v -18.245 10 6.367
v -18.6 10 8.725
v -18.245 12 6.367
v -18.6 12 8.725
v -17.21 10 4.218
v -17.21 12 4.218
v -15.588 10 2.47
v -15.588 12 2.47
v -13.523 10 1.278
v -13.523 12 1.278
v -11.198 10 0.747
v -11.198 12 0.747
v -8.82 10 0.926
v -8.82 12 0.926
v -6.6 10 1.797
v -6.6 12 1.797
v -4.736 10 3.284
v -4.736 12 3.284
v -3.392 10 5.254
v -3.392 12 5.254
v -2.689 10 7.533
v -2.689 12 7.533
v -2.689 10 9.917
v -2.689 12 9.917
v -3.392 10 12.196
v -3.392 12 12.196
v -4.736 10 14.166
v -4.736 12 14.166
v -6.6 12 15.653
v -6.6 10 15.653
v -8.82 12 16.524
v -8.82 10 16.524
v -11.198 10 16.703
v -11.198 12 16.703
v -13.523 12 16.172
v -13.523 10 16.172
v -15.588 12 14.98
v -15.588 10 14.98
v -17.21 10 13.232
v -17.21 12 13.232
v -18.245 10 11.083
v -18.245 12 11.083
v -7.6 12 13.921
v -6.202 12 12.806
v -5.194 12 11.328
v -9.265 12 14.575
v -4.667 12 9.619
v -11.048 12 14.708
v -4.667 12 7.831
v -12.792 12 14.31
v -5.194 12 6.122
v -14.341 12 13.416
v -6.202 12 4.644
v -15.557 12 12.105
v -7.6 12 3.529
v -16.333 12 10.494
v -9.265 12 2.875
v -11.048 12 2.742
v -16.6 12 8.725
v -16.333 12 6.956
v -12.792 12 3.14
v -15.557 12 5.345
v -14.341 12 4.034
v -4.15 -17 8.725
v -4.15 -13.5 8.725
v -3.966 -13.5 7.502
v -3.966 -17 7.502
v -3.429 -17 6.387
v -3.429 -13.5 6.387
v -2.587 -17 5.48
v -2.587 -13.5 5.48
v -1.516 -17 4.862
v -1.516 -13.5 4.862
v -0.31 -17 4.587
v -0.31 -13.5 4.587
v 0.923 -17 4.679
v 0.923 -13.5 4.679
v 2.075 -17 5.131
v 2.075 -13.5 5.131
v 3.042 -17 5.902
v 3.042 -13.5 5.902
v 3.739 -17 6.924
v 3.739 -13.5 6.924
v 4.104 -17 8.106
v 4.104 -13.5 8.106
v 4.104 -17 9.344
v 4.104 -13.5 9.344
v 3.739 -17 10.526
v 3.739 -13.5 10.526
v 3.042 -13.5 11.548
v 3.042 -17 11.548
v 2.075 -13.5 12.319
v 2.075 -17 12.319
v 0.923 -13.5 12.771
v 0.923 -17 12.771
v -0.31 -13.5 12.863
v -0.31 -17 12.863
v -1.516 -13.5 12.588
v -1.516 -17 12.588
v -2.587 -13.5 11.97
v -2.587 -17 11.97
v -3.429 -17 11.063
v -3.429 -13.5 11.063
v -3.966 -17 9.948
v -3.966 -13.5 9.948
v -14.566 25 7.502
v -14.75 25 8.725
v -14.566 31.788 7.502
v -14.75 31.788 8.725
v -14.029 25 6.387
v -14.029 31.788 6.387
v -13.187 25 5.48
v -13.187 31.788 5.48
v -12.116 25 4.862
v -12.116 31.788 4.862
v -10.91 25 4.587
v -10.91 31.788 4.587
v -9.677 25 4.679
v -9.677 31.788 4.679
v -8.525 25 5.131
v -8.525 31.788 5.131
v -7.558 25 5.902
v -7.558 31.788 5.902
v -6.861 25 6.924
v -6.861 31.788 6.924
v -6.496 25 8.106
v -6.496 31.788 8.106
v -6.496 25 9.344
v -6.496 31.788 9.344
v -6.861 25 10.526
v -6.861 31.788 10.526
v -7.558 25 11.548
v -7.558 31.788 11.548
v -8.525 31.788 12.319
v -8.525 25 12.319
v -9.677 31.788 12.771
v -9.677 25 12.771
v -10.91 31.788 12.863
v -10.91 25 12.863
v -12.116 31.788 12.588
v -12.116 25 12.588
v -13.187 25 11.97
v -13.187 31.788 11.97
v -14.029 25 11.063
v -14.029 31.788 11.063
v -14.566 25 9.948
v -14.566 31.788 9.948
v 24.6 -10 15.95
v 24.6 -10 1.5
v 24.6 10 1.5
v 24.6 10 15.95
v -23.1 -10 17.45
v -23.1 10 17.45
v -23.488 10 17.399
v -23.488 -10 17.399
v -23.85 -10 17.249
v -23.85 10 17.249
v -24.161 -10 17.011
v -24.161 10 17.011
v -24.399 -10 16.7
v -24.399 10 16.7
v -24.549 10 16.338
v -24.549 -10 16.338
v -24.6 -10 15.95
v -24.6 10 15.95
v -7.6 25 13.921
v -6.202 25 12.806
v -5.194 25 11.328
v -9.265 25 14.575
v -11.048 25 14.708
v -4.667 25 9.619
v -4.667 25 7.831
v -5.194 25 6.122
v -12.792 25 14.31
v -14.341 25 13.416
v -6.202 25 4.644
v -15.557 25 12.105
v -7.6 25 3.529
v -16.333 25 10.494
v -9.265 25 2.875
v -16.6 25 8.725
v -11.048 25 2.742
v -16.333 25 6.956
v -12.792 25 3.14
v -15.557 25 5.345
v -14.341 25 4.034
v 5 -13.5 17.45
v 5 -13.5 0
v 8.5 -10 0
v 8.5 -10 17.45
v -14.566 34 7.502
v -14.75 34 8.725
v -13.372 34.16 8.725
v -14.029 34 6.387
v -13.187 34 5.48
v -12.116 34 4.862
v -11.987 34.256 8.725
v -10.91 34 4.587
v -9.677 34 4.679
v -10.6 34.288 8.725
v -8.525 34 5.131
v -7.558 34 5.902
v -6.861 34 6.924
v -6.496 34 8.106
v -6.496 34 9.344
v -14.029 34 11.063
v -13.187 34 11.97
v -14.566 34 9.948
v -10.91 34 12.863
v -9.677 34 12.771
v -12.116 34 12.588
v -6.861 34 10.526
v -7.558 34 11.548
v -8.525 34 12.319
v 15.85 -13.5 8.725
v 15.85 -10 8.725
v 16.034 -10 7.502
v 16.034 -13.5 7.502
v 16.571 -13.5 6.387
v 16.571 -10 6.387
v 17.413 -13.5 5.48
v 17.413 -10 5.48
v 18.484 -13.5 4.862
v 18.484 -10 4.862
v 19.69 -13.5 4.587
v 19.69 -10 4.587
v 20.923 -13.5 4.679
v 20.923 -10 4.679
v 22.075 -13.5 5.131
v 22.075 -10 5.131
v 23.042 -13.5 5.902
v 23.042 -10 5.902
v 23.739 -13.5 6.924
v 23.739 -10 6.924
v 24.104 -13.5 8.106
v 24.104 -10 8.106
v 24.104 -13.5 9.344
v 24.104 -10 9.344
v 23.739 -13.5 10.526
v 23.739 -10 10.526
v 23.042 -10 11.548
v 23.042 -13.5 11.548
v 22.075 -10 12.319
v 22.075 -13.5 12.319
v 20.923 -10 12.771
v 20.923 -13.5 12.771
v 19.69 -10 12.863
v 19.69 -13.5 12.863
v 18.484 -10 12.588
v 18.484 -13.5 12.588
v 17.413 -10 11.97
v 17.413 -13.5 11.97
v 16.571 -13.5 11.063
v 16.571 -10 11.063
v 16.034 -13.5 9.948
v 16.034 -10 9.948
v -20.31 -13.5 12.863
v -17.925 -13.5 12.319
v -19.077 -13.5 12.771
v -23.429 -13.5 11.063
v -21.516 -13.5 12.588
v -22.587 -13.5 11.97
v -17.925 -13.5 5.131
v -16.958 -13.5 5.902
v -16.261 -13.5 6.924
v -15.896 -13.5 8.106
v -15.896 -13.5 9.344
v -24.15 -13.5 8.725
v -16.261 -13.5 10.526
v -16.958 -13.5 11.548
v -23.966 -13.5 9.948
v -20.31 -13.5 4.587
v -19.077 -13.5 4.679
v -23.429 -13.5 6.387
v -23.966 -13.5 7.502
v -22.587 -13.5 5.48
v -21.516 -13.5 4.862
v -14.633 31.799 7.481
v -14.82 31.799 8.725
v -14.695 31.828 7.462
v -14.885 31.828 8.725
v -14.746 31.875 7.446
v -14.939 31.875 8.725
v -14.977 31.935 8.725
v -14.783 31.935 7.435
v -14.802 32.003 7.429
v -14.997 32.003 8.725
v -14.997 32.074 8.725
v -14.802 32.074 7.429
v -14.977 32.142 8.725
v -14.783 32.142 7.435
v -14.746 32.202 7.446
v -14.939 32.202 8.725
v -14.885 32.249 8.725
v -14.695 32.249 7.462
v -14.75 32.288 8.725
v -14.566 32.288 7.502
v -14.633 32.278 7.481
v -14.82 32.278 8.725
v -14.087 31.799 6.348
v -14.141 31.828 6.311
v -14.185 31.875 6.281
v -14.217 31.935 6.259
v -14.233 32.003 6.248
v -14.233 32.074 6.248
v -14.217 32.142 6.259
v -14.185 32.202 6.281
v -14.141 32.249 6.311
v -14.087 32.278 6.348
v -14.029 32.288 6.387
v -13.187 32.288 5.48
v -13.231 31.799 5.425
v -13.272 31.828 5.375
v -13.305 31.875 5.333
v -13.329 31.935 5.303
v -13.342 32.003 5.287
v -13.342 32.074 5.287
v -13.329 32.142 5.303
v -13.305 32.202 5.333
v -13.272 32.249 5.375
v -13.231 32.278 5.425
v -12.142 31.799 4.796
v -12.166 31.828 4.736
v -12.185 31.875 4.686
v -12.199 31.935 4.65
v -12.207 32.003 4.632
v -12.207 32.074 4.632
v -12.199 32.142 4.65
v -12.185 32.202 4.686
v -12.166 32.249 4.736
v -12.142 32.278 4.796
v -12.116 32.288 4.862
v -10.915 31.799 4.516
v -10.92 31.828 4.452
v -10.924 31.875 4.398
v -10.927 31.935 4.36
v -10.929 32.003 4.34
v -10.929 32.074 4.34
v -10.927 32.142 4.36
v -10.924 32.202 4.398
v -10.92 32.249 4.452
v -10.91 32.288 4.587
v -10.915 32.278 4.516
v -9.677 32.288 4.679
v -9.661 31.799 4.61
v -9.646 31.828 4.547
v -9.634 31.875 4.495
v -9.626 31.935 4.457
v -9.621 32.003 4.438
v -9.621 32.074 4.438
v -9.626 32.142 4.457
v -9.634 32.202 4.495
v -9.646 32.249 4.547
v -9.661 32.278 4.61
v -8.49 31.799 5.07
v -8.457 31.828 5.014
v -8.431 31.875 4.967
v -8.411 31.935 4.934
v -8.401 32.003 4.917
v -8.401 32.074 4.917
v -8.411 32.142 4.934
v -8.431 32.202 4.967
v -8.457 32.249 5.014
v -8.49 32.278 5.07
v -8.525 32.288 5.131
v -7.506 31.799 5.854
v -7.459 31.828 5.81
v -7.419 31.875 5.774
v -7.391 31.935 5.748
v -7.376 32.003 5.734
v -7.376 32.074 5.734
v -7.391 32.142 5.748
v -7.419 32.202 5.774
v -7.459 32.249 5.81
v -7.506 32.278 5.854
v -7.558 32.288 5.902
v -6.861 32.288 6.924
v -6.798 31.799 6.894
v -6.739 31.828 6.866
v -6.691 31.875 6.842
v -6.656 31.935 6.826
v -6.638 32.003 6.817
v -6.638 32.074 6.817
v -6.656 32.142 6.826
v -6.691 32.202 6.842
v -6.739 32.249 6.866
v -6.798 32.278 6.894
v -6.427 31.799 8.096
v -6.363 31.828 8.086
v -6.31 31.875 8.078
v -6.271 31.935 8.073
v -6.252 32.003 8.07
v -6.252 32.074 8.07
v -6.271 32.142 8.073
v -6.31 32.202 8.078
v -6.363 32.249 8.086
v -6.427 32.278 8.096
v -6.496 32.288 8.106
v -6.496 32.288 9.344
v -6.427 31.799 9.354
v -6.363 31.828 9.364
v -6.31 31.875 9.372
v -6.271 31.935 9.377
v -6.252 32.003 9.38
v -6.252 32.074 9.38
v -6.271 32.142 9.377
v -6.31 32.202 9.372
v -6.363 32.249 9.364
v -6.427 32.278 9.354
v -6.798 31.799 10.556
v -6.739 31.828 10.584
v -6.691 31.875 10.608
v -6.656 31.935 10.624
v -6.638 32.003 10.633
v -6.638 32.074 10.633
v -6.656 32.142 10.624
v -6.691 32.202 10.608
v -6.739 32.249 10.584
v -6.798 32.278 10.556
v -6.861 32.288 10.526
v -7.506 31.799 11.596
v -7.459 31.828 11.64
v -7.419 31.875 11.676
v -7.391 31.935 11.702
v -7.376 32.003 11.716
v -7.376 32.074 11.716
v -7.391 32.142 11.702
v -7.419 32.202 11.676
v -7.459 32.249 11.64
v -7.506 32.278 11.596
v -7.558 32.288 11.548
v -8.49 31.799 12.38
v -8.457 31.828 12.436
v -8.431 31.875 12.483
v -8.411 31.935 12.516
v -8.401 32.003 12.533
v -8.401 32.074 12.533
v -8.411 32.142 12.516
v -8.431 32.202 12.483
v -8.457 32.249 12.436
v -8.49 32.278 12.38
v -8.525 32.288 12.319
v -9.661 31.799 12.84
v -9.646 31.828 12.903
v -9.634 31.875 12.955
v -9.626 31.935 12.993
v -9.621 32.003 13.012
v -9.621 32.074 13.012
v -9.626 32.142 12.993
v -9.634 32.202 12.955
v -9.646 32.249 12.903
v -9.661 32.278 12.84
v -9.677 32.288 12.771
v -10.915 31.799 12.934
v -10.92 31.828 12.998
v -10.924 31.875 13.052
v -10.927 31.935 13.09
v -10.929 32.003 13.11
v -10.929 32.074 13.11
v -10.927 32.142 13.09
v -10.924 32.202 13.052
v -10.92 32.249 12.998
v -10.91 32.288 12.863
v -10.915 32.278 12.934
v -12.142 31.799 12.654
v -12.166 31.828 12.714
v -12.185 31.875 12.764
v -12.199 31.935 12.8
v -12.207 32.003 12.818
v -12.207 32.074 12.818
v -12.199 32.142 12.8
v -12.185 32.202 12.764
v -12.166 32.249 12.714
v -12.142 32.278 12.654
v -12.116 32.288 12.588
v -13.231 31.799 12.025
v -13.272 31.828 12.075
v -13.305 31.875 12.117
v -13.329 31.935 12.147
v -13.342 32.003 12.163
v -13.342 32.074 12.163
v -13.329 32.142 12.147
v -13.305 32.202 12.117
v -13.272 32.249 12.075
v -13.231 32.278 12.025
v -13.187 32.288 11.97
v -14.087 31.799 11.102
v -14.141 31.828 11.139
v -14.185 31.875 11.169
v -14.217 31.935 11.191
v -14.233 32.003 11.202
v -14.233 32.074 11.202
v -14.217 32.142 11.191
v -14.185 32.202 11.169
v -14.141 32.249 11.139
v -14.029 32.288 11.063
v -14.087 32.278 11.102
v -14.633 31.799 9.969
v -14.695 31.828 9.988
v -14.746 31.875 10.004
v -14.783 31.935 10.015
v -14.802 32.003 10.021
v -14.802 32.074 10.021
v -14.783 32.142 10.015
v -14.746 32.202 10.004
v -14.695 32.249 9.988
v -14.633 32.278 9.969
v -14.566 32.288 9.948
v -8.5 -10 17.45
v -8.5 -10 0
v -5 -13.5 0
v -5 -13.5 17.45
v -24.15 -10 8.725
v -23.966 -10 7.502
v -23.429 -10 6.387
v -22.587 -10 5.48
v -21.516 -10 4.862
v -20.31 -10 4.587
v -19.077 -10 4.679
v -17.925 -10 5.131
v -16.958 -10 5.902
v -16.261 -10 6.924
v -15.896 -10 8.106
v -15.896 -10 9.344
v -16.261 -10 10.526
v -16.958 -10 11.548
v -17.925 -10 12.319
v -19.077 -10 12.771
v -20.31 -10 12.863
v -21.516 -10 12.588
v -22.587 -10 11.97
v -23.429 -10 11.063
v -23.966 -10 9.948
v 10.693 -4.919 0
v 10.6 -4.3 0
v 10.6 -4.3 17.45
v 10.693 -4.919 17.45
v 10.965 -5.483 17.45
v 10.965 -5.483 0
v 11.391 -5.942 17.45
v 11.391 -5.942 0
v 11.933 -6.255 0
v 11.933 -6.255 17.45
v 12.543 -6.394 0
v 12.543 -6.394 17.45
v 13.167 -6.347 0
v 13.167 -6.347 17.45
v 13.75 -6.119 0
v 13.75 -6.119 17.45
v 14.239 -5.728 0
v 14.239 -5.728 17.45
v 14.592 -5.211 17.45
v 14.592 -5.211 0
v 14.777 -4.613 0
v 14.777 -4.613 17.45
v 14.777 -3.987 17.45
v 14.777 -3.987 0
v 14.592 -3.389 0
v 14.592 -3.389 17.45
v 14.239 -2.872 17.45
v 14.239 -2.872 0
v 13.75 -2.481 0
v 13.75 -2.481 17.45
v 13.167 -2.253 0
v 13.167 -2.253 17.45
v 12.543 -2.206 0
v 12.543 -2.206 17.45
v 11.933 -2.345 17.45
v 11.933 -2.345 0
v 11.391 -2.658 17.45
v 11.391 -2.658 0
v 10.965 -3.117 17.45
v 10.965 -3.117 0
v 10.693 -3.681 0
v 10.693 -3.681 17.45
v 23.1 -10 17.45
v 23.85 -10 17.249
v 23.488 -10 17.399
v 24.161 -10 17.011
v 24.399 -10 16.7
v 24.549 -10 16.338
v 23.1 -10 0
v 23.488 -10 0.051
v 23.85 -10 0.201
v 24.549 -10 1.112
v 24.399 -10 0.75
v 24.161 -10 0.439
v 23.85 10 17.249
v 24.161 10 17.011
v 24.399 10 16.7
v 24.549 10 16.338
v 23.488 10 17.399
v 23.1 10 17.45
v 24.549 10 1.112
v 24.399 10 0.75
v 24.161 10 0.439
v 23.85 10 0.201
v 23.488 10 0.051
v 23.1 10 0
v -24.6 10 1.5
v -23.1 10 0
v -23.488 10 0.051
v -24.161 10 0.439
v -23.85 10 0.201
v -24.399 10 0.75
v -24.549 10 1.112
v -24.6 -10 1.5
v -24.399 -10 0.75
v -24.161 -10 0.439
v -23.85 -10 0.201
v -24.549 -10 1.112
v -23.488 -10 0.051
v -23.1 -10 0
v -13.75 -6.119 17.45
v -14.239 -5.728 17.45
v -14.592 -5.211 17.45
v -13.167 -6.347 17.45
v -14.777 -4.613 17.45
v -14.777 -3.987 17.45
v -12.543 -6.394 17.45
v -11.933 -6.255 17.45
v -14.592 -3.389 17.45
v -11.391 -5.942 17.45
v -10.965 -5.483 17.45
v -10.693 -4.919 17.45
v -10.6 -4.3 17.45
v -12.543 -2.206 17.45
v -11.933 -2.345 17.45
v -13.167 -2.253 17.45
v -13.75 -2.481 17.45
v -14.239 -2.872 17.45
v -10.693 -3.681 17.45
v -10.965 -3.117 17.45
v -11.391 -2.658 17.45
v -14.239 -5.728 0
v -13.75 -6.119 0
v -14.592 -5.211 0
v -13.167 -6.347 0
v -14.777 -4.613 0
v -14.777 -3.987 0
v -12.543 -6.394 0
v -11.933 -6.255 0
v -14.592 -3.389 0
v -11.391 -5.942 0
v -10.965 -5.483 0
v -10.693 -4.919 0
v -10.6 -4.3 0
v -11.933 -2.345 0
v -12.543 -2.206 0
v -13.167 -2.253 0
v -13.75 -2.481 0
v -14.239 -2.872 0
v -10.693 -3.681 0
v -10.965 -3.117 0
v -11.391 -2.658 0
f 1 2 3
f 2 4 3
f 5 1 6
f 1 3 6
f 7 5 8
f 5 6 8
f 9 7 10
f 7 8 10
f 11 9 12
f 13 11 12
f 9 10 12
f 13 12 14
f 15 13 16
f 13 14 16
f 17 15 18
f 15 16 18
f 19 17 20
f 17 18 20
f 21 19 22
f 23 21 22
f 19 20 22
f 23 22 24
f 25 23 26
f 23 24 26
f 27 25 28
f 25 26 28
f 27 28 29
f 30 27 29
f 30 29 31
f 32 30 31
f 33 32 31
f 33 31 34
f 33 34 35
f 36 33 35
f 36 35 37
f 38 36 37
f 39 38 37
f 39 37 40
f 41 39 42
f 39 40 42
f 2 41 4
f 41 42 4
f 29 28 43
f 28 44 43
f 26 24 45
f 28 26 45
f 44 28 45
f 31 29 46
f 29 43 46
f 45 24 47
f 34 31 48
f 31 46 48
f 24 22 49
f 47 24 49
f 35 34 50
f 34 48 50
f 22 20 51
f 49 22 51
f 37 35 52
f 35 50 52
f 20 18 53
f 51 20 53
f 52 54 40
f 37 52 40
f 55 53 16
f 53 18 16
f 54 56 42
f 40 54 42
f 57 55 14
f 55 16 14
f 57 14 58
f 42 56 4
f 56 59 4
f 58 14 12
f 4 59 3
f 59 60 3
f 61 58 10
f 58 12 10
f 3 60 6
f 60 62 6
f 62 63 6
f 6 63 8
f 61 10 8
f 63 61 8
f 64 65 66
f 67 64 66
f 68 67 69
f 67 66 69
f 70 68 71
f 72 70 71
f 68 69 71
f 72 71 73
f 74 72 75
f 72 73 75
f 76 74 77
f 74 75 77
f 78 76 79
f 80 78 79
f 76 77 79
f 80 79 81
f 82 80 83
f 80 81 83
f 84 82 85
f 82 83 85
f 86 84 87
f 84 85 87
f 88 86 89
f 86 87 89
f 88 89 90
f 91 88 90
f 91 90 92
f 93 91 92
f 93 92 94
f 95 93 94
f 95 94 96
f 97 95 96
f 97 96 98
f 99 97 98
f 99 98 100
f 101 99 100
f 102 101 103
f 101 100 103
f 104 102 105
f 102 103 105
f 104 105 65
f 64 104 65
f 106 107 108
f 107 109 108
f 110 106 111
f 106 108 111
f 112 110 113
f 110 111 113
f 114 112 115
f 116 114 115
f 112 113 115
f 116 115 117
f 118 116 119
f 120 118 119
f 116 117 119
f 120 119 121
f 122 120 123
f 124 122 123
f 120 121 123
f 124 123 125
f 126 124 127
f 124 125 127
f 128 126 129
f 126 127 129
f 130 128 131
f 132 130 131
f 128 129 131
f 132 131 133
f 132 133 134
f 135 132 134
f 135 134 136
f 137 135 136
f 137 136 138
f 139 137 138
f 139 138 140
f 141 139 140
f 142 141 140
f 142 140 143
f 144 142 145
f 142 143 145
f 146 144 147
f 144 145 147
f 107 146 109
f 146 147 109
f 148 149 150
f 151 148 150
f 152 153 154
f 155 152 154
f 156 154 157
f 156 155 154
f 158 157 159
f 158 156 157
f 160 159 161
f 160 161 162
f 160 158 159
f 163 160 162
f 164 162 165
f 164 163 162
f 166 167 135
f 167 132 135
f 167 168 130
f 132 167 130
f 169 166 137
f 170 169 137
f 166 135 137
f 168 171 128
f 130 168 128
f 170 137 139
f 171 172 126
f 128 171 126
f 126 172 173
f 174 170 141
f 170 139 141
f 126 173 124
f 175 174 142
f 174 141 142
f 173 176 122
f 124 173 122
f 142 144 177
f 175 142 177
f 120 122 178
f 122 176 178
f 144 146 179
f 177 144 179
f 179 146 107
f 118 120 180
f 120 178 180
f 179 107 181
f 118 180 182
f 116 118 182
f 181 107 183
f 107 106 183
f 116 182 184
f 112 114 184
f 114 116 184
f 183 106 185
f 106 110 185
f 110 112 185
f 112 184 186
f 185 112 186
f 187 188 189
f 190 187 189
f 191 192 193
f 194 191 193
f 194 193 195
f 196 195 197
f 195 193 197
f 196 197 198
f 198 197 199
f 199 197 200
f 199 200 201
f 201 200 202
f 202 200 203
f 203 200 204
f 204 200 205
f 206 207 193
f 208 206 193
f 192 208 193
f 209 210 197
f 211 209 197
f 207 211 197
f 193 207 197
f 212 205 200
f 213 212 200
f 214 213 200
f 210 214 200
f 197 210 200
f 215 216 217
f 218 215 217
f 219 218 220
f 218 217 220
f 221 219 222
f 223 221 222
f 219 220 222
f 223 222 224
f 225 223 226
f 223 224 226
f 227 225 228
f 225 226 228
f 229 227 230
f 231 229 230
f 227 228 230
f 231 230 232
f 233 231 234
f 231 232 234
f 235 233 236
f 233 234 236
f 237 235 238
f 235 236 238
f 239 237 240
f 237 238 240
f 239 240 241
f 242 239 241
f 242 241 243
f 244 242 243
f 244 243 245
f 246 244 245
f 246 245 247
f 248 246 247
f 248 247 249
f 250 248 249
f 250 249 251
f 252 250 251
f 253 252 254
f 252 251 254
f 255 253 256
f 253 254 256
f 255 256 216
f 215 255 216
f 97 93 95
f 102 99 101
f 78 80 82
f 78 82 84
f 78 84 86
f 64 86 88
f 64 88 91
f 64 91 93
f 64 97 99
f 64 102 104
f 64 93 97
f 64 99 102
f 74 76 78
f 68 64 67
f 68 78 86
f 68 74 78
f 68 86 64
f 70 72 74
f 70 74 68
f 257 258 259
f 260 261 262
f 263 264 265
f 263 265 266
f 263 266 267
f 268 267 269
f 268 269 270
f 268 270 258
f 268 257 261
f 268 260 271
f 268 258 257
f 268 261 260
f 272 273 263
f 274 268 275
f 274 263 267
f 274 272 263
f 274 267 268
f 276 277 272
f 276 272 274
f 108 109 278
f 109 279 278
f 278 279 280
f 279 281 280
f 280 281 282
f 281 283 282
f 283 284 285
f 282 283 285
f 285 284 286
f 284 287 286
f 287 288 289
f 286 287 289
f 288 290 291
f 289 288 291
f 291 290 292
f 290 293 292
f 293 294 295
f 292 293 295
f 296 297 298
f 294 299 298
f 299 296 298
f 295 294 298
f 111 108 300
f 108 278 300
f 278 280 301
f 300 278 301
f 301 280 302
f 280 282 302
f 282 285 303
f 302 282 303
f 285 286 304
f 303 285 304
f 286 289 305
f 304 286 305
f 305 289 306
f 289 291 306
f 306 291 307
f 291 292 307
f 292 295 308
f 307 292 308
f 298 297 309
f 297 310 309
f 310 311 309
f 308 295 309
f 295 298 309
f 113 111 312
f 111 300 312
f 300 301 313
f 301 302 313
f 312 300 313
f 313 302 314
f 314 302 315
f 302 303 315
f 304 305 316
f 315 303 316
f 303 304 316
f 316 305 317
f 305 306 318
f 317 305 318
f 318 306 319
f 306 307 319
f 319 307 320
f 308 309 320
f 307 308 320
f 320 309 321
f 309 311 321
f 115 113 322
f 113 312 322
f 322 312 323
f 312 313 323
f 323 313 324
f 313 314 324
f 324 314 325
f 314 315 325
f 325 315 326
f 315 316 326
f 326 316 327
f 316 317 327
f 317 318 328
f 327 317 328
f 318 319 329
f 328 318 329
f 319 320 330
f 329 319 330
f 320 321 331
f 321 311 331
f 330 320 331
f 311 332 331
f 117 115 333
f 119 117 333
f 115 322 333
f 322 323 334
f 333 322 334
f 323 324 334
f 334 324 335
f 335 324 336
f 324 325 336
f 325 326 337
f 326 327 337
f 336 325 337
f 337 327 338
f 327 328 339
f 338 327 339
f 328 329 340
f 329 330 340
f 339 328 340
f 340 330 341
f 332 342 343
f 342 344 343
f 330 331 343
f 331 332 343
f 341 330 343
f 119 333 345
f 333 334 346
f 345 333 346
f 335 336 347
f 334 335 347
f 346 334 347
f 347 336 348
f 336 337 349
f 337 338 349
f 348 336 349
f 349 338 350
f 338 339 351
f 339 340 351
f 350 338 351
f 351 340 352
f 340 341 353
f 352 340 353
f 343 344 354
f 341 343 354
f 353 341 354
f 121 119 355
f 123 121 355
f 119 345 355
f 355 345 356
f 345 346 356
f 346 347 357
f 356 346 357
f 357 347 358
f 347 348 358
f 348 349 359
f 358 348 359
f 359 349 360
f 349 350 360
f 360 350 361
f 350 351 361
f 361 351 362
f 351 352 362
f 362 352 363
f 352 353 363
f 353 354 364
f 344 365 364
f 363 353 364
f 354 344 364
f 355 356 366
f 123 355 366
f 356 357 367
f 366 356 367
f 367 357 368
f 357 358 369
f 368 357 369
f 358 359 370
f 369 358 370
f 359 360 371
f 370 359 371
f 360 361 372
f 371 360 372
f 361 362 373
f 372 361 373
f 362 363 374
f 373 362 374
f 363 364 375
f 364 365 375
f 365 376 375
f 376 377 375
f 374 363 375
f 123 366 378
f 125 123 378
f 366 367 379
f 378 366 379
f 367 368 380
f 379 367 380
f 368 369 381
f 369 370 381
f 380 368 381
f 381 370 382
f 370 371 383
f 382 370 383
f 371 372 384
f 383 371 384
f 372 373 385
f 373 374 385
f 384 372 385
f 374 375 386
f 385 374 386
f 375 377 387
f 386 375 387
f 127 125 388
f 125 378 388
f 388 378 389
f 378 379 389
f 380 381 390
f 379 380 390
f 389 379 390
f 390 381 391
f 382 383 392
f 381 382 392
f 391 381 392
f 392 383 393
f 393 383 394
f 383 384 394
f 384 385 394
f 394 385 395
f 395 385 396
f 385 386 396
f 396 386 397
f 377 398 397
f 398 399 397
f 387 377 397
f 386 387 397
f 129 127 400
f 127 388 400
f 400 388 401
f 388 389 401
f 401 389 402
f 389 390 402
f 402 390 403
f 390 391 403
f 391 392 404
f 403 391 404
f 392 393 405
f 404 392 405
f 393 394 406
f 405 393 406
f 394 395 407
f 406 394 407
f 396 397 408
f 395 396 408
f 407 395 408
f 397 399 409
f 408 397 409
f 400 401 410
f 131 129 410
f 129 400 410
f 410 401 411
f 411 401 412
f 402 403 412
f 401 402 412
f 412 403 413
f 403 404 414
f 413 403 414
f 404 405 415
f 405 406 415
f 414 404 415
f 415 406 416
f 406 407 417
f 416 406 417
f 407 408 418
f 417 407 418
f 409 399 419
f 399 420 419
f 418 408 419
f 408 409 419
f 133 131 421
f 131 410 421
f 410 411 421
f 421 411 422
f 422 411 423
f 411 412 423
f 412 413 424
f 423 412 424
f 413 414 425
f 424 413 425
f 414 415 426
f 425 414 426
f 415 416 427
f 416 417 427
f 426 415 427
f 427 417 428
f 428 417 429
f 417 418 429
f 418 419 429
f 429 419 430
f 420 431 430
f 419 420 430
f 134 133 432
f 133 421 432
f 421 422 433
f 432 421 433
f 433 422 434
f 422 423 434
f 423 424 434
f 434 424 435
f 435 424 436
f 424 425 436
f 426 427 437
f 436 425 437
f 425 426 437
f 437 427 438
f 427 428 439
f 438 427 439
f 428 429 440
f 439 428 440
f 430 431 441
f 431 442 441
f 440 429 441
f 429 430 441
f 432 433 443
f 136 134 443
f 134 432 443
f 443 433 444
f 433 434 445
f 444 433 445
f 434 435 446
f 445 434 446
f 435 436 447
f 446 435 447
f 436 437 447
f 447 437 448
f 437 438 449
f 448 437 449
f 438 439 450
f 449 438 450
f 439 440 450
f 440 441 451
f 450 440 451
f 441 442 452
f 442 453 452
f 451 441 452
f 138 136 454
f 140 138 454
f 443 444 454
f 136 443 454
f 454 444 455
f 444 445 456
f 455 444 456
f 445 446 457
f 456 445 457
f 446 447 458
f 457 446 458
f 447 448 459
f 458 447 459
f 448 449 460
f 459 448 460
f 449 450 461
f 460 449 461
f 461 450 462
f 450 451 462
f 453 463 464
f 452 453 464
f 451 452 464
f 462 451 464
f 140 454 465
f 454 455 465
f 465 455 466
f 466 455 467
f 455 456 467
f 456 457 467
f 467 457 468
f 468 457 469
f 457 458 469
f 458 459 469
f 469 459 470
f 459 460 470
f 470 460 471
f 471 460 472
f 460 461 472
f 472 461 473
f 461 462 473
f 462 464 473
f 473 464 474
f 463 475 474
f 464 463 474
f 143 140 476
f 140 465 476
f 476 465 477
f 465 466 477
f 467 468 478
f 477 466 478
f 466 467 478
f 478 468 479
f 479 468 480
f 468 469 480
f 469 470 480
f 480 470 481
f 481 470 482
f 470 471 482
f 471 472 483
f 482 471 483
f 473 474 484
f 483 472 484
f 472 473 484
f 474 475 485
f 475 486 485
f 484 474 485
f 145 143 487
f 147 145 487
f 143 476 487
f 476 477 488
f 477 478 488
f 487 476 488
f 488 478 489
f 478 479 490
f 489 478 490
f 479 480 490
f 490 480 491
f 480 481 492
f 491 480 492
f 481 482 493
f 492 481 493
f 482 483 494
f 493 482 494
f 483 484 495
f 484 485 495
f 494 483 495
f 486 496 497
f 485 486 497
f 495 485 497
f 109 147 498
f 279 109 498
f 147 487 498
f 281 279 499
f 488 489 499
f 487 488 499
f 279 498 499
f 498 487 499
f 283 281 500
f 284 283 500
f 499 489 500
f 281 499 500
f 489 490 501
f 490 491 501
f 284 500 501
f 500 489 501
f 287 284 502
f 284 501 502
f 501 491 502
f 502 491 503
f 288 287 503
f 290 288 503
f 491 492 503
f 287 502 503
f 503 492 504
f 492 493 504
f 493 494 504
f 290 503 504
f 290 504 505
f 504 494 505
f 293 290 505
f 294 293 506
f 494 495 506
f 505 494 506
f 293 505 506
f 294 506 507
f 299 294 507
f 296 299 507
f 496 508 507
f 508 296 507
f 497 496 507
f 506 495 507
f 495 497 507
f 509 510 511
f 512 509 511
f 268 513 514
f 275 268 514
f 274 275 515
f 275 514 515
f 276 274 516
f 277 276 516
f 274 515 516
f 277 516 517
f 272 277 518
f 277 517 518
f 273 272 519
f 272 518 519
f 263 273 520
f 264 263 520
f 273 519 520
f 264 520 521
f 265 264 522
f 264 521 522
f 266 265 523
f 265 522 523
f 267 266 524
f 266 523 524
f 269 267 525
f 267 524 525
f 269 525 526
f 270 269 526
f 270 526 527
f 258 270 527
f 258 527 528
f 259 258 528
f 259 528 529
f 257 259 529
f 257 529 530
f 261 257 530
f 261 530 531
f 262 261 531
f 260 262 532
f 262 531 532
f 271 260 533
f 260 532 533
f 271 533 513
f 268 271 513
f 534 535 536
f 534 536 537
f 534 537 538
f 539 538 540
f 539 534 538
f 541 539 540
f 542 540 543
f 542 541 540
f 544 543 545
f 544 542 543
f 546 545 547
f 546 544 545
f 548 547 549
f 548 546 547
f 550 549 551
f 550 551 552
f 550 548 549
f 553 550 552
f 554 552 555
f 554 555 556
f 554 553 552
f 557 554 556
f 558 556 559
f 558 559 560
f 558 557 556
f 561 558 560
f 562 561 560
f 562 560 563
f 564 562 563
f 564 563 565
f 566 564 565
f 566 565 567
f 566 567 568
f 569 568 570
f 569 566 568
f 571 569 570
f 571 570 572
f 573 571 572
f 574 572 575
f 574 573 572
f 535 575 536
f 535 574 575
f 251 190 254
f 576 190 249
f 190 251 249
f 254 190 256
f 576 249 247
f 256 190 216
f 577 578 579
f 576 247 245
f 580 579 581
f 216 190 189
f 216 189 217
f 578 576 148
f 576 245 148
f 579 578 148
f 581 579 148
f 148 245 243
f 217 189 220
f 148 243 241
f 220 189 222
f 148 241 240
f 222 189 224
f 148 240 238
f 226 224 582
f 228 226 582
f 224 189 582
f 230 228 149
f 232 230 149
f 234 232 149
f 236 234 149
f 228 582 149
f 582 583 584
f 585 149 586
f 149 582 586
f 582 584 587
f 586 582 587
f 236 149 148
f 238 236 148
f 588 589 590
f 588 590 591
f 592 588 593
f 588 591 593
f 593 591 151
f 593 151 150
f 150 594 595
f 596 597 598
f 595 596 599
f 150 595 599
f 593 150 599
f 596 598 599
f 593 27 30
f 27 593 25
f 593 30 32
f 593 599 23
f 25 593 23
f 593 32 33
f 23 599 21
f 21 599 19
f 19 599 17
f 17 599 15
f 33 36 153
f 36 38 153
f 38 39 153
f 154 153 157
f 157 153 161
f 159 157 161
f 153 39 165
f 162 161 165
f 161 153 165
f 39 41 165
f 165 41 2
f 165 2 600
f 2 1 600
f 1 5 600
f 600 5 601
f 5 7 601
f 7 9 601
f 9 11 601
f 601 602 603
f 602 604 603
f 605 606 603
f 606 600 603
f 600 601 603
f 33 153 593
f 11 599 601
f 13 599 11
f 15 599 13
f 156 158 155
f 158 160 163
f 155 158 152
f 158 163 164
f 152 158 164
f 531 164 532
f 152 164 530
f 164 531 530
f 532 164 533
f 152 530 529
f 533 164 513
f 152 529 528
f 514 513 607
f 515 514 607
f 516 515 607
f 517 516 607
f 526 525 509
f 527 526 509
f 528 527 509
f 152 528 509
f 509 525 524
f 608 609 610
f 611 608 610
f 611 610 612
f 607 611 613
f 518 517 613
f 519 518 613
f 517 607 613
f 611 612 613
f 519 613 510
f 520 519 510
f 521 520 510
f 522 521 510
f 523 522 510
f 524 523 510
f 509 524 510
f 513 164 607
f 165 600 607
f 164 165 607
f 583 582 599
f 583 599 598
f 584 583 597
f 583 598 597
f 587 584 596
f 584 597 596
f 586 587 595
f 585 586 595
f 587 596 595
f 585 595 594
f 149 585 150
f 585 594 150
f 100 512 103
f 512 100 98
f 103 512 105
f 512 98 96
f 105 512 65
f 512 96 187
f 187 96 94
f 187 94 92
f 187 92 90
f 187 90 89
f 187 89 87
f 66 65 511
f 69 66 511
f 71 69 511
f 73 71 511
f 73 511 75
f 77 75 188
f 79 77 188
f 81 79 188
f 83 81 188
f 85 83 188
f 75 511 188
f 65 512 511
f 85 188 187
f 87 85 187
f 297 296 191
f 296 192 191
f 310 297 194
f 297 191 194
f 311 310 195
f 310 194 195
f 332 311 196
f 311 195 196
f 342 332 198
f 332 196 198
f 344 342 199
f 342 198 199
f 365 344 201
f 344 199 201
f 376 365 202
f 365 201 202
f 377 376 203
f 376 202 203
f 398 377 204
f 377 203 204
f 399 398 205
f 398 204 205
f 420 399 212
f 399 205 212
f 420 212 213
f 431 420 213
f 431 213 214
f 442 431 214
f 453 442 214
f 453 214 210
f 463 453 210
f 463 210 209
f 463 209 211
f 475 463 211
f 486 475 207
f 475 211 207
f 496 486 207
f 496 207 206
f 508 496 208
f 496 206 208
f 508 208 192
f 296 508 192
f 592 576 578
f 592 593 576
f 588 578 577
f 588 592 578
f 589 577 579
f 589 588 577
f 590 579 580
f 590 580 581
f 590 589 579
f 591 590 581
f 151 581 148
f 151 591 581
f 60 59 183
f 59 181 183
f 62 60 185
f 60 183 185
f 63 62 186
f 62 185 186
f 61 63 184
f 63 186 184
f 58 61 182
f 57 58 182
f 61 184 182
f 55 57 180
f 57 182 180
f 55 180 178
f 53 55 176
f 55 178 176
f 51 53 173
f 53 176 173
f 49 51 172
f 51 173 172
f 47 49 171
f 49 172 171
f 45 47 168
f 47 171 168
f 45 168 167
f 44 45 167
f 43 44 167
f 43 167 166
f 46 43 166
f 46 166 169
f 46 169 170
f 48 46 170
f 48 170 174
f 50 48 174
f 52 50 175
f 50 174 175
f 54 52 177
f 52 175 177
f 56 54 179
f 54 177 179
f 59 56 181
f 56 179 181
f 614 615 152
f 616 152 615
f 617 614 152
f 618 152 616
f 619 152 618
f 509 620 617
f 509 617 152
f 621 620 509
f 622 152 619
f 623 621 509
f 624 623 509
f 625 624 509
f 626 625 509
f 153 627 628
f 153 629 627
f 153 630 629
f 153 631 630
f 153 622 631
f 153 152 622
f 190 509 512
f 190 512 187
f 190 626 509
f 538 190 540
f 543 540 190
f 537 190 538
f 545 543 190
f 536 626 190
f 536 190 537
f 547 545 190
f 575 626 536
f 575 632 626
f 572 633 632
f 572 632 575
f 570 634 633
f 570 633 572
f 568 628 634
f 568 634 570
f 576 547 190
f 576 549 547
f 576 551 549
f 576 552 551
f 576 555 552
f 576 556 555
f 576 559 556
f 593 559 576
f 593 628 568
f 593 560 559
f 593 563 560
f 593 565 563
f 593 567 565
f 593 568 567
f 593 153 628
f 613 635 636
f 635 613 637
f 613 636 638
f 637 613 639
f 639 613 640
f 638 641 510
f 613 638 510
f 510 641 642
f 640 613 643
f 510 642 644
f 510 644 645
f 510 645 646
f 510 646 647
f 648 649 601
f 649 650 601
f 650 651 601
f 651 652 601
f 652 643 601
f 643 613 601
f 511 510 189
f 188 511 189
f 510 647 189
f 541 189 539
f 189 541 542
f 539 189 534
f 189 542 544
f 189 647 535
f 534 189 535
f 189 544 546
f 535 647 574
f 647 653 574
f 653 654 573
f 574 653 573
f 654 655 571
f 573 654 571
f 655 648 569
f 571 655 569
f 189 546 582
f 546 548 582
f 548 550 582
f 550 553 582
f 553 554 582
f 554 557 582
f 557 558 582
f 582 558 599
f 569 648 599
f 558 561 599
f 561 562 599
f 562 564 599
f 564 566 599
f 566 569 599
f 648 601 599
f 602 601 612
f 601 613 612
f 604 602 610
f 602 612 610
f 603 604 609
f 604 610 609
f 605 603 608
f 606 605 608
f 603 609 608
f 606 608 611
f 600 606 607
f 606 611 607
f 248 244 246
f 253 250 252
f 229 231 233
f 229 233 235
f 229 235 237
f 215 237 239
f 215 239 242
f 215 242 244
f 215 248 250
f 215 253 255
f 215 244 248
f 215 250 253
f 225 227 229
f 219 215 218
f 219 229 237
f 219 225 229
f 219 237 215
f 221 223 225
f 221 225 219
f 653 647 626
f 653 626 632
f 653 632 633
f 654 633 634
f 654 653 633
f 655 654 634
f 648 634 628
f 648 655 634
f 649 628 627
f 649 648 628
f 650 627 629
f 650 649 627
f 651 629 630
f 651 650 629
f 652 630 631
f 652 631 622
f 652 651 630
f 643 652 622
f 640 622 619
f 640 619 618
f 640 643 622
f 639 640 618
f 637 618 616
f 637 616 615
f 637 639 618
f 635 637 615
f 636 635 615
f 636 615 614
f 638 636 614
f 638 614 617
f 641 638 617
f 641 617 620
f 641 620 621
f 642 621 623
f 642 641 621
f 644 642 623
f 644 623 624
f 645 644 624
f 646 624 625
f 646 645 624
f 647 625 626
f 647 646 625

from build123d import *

# Parameters (mm, degrees)
SKETCH_1_R      = 2.1
EXTRUDE_1_DEPTH = 17.45
SKETCH_2_R      = 4.15
EXTRUDE_2_DEPTH = 3.5
SKETCH_3_R      = 4.15
EXTRUDE_3_DEPTH = 3.5
FILLET_1_R      = 1.5


with BuildPart() as part:
    # ｽｹｯﾁ1 → ﾎﾞｽ - 押し出し1 (new body)
    with BuildSketch(Plane.XY):
        Polygon((-5, -13.5), (5, -13.5), (8.5, -10), (24.6, -10), (24.6, 10), (-24.6, 10), (-24.6, -10), (-8.5, -10), align=None)
        with Locations((-12.7, -4.3)):
            Circle(SKETCH_1_R, mode=Mode.SUBTRACT)
        with Locations(Location((12.7, -4.3, 0), (0, 0, 180))):
            Circle(SKETCH_1_R, mode=Mode.SUBTRACT)
    extrude(amount=EXTRUDE_1_DEPTH)

    # ｽｹｯﾁ2 → ﾎﾞｽ - 押し出し2 (add)
    with BuildSketch(Plane.XZ.offset(10)):
        with Locations(Location((-20, 8.725, 0), (0, 0, 180))):
            Circle(SKETCH_2_R)
        with Locations(Location((20, 8.725, 0), (0, 0, 180))):
            Circle(SKETCH_2_R)
    extrude(amount=EXTRUDE_2_DEPTH)

    # ｽｹｯﾁ3 → ﾎﾞｽ - 押し出し3 (add)
    with BuildSketch(Plane.XZ.offset(13.5)):
        with Locations(Location((0, 8.725, 0), (0, 0, 180))):
            Circle(SKETCH_3_R)
    extrude(amount=EXTRUDE_3_DEPTH)

    # ｽｹｯﾁ5 → 回転1 (revolve)
    with BuildSketch(Plane.XY.offset(8.725)):
        with BuildLine():
            Line((-10.6, 10), (-18.6, 10))
            Line((-18.6, 10), (-18.6, 12))
            Line((-18.6, 12), (-16.6, 12))
            Line((-16.6, 12), (-16.6, 25))
            Line((-16.6, 25), (-14.75, 25))
            Line((-14.75, 25), (-14.75, 31.78842818))
            ThreePointArc((-14.75, 31.78842818), (-15, 32.03842818), (-14.75, 32.28842818))
            Line((-14.75, 32.28842818), (-14.75, 34))
            ThreePointArc((-14.75, 34), (-12.680005458, 34.216234269), (-10.6, 34.28842818))
            Line((-10.6, 34.28842818), (-10.6, 34))
            Line((-10.6, 34), (-10.6, 10))
        make_face()
    revolve(axis=Axis((-10.6, 27.136449726, 8.725), (0, -1, 0)))

    # ﾌｨﾚｯﾄ1
    fillet_1_edges = [part.edges().sort_by_distance(p)[0] for p in [
        (24.6, 0, 17.45),
        (-24.6, 0, 17.45),
        (-24.6, 0, 0),
        (24.6, 0, 0),
    ]]
    fillet(fillet_1_edges, radius=FILLET_1_R)


solid = part.part
